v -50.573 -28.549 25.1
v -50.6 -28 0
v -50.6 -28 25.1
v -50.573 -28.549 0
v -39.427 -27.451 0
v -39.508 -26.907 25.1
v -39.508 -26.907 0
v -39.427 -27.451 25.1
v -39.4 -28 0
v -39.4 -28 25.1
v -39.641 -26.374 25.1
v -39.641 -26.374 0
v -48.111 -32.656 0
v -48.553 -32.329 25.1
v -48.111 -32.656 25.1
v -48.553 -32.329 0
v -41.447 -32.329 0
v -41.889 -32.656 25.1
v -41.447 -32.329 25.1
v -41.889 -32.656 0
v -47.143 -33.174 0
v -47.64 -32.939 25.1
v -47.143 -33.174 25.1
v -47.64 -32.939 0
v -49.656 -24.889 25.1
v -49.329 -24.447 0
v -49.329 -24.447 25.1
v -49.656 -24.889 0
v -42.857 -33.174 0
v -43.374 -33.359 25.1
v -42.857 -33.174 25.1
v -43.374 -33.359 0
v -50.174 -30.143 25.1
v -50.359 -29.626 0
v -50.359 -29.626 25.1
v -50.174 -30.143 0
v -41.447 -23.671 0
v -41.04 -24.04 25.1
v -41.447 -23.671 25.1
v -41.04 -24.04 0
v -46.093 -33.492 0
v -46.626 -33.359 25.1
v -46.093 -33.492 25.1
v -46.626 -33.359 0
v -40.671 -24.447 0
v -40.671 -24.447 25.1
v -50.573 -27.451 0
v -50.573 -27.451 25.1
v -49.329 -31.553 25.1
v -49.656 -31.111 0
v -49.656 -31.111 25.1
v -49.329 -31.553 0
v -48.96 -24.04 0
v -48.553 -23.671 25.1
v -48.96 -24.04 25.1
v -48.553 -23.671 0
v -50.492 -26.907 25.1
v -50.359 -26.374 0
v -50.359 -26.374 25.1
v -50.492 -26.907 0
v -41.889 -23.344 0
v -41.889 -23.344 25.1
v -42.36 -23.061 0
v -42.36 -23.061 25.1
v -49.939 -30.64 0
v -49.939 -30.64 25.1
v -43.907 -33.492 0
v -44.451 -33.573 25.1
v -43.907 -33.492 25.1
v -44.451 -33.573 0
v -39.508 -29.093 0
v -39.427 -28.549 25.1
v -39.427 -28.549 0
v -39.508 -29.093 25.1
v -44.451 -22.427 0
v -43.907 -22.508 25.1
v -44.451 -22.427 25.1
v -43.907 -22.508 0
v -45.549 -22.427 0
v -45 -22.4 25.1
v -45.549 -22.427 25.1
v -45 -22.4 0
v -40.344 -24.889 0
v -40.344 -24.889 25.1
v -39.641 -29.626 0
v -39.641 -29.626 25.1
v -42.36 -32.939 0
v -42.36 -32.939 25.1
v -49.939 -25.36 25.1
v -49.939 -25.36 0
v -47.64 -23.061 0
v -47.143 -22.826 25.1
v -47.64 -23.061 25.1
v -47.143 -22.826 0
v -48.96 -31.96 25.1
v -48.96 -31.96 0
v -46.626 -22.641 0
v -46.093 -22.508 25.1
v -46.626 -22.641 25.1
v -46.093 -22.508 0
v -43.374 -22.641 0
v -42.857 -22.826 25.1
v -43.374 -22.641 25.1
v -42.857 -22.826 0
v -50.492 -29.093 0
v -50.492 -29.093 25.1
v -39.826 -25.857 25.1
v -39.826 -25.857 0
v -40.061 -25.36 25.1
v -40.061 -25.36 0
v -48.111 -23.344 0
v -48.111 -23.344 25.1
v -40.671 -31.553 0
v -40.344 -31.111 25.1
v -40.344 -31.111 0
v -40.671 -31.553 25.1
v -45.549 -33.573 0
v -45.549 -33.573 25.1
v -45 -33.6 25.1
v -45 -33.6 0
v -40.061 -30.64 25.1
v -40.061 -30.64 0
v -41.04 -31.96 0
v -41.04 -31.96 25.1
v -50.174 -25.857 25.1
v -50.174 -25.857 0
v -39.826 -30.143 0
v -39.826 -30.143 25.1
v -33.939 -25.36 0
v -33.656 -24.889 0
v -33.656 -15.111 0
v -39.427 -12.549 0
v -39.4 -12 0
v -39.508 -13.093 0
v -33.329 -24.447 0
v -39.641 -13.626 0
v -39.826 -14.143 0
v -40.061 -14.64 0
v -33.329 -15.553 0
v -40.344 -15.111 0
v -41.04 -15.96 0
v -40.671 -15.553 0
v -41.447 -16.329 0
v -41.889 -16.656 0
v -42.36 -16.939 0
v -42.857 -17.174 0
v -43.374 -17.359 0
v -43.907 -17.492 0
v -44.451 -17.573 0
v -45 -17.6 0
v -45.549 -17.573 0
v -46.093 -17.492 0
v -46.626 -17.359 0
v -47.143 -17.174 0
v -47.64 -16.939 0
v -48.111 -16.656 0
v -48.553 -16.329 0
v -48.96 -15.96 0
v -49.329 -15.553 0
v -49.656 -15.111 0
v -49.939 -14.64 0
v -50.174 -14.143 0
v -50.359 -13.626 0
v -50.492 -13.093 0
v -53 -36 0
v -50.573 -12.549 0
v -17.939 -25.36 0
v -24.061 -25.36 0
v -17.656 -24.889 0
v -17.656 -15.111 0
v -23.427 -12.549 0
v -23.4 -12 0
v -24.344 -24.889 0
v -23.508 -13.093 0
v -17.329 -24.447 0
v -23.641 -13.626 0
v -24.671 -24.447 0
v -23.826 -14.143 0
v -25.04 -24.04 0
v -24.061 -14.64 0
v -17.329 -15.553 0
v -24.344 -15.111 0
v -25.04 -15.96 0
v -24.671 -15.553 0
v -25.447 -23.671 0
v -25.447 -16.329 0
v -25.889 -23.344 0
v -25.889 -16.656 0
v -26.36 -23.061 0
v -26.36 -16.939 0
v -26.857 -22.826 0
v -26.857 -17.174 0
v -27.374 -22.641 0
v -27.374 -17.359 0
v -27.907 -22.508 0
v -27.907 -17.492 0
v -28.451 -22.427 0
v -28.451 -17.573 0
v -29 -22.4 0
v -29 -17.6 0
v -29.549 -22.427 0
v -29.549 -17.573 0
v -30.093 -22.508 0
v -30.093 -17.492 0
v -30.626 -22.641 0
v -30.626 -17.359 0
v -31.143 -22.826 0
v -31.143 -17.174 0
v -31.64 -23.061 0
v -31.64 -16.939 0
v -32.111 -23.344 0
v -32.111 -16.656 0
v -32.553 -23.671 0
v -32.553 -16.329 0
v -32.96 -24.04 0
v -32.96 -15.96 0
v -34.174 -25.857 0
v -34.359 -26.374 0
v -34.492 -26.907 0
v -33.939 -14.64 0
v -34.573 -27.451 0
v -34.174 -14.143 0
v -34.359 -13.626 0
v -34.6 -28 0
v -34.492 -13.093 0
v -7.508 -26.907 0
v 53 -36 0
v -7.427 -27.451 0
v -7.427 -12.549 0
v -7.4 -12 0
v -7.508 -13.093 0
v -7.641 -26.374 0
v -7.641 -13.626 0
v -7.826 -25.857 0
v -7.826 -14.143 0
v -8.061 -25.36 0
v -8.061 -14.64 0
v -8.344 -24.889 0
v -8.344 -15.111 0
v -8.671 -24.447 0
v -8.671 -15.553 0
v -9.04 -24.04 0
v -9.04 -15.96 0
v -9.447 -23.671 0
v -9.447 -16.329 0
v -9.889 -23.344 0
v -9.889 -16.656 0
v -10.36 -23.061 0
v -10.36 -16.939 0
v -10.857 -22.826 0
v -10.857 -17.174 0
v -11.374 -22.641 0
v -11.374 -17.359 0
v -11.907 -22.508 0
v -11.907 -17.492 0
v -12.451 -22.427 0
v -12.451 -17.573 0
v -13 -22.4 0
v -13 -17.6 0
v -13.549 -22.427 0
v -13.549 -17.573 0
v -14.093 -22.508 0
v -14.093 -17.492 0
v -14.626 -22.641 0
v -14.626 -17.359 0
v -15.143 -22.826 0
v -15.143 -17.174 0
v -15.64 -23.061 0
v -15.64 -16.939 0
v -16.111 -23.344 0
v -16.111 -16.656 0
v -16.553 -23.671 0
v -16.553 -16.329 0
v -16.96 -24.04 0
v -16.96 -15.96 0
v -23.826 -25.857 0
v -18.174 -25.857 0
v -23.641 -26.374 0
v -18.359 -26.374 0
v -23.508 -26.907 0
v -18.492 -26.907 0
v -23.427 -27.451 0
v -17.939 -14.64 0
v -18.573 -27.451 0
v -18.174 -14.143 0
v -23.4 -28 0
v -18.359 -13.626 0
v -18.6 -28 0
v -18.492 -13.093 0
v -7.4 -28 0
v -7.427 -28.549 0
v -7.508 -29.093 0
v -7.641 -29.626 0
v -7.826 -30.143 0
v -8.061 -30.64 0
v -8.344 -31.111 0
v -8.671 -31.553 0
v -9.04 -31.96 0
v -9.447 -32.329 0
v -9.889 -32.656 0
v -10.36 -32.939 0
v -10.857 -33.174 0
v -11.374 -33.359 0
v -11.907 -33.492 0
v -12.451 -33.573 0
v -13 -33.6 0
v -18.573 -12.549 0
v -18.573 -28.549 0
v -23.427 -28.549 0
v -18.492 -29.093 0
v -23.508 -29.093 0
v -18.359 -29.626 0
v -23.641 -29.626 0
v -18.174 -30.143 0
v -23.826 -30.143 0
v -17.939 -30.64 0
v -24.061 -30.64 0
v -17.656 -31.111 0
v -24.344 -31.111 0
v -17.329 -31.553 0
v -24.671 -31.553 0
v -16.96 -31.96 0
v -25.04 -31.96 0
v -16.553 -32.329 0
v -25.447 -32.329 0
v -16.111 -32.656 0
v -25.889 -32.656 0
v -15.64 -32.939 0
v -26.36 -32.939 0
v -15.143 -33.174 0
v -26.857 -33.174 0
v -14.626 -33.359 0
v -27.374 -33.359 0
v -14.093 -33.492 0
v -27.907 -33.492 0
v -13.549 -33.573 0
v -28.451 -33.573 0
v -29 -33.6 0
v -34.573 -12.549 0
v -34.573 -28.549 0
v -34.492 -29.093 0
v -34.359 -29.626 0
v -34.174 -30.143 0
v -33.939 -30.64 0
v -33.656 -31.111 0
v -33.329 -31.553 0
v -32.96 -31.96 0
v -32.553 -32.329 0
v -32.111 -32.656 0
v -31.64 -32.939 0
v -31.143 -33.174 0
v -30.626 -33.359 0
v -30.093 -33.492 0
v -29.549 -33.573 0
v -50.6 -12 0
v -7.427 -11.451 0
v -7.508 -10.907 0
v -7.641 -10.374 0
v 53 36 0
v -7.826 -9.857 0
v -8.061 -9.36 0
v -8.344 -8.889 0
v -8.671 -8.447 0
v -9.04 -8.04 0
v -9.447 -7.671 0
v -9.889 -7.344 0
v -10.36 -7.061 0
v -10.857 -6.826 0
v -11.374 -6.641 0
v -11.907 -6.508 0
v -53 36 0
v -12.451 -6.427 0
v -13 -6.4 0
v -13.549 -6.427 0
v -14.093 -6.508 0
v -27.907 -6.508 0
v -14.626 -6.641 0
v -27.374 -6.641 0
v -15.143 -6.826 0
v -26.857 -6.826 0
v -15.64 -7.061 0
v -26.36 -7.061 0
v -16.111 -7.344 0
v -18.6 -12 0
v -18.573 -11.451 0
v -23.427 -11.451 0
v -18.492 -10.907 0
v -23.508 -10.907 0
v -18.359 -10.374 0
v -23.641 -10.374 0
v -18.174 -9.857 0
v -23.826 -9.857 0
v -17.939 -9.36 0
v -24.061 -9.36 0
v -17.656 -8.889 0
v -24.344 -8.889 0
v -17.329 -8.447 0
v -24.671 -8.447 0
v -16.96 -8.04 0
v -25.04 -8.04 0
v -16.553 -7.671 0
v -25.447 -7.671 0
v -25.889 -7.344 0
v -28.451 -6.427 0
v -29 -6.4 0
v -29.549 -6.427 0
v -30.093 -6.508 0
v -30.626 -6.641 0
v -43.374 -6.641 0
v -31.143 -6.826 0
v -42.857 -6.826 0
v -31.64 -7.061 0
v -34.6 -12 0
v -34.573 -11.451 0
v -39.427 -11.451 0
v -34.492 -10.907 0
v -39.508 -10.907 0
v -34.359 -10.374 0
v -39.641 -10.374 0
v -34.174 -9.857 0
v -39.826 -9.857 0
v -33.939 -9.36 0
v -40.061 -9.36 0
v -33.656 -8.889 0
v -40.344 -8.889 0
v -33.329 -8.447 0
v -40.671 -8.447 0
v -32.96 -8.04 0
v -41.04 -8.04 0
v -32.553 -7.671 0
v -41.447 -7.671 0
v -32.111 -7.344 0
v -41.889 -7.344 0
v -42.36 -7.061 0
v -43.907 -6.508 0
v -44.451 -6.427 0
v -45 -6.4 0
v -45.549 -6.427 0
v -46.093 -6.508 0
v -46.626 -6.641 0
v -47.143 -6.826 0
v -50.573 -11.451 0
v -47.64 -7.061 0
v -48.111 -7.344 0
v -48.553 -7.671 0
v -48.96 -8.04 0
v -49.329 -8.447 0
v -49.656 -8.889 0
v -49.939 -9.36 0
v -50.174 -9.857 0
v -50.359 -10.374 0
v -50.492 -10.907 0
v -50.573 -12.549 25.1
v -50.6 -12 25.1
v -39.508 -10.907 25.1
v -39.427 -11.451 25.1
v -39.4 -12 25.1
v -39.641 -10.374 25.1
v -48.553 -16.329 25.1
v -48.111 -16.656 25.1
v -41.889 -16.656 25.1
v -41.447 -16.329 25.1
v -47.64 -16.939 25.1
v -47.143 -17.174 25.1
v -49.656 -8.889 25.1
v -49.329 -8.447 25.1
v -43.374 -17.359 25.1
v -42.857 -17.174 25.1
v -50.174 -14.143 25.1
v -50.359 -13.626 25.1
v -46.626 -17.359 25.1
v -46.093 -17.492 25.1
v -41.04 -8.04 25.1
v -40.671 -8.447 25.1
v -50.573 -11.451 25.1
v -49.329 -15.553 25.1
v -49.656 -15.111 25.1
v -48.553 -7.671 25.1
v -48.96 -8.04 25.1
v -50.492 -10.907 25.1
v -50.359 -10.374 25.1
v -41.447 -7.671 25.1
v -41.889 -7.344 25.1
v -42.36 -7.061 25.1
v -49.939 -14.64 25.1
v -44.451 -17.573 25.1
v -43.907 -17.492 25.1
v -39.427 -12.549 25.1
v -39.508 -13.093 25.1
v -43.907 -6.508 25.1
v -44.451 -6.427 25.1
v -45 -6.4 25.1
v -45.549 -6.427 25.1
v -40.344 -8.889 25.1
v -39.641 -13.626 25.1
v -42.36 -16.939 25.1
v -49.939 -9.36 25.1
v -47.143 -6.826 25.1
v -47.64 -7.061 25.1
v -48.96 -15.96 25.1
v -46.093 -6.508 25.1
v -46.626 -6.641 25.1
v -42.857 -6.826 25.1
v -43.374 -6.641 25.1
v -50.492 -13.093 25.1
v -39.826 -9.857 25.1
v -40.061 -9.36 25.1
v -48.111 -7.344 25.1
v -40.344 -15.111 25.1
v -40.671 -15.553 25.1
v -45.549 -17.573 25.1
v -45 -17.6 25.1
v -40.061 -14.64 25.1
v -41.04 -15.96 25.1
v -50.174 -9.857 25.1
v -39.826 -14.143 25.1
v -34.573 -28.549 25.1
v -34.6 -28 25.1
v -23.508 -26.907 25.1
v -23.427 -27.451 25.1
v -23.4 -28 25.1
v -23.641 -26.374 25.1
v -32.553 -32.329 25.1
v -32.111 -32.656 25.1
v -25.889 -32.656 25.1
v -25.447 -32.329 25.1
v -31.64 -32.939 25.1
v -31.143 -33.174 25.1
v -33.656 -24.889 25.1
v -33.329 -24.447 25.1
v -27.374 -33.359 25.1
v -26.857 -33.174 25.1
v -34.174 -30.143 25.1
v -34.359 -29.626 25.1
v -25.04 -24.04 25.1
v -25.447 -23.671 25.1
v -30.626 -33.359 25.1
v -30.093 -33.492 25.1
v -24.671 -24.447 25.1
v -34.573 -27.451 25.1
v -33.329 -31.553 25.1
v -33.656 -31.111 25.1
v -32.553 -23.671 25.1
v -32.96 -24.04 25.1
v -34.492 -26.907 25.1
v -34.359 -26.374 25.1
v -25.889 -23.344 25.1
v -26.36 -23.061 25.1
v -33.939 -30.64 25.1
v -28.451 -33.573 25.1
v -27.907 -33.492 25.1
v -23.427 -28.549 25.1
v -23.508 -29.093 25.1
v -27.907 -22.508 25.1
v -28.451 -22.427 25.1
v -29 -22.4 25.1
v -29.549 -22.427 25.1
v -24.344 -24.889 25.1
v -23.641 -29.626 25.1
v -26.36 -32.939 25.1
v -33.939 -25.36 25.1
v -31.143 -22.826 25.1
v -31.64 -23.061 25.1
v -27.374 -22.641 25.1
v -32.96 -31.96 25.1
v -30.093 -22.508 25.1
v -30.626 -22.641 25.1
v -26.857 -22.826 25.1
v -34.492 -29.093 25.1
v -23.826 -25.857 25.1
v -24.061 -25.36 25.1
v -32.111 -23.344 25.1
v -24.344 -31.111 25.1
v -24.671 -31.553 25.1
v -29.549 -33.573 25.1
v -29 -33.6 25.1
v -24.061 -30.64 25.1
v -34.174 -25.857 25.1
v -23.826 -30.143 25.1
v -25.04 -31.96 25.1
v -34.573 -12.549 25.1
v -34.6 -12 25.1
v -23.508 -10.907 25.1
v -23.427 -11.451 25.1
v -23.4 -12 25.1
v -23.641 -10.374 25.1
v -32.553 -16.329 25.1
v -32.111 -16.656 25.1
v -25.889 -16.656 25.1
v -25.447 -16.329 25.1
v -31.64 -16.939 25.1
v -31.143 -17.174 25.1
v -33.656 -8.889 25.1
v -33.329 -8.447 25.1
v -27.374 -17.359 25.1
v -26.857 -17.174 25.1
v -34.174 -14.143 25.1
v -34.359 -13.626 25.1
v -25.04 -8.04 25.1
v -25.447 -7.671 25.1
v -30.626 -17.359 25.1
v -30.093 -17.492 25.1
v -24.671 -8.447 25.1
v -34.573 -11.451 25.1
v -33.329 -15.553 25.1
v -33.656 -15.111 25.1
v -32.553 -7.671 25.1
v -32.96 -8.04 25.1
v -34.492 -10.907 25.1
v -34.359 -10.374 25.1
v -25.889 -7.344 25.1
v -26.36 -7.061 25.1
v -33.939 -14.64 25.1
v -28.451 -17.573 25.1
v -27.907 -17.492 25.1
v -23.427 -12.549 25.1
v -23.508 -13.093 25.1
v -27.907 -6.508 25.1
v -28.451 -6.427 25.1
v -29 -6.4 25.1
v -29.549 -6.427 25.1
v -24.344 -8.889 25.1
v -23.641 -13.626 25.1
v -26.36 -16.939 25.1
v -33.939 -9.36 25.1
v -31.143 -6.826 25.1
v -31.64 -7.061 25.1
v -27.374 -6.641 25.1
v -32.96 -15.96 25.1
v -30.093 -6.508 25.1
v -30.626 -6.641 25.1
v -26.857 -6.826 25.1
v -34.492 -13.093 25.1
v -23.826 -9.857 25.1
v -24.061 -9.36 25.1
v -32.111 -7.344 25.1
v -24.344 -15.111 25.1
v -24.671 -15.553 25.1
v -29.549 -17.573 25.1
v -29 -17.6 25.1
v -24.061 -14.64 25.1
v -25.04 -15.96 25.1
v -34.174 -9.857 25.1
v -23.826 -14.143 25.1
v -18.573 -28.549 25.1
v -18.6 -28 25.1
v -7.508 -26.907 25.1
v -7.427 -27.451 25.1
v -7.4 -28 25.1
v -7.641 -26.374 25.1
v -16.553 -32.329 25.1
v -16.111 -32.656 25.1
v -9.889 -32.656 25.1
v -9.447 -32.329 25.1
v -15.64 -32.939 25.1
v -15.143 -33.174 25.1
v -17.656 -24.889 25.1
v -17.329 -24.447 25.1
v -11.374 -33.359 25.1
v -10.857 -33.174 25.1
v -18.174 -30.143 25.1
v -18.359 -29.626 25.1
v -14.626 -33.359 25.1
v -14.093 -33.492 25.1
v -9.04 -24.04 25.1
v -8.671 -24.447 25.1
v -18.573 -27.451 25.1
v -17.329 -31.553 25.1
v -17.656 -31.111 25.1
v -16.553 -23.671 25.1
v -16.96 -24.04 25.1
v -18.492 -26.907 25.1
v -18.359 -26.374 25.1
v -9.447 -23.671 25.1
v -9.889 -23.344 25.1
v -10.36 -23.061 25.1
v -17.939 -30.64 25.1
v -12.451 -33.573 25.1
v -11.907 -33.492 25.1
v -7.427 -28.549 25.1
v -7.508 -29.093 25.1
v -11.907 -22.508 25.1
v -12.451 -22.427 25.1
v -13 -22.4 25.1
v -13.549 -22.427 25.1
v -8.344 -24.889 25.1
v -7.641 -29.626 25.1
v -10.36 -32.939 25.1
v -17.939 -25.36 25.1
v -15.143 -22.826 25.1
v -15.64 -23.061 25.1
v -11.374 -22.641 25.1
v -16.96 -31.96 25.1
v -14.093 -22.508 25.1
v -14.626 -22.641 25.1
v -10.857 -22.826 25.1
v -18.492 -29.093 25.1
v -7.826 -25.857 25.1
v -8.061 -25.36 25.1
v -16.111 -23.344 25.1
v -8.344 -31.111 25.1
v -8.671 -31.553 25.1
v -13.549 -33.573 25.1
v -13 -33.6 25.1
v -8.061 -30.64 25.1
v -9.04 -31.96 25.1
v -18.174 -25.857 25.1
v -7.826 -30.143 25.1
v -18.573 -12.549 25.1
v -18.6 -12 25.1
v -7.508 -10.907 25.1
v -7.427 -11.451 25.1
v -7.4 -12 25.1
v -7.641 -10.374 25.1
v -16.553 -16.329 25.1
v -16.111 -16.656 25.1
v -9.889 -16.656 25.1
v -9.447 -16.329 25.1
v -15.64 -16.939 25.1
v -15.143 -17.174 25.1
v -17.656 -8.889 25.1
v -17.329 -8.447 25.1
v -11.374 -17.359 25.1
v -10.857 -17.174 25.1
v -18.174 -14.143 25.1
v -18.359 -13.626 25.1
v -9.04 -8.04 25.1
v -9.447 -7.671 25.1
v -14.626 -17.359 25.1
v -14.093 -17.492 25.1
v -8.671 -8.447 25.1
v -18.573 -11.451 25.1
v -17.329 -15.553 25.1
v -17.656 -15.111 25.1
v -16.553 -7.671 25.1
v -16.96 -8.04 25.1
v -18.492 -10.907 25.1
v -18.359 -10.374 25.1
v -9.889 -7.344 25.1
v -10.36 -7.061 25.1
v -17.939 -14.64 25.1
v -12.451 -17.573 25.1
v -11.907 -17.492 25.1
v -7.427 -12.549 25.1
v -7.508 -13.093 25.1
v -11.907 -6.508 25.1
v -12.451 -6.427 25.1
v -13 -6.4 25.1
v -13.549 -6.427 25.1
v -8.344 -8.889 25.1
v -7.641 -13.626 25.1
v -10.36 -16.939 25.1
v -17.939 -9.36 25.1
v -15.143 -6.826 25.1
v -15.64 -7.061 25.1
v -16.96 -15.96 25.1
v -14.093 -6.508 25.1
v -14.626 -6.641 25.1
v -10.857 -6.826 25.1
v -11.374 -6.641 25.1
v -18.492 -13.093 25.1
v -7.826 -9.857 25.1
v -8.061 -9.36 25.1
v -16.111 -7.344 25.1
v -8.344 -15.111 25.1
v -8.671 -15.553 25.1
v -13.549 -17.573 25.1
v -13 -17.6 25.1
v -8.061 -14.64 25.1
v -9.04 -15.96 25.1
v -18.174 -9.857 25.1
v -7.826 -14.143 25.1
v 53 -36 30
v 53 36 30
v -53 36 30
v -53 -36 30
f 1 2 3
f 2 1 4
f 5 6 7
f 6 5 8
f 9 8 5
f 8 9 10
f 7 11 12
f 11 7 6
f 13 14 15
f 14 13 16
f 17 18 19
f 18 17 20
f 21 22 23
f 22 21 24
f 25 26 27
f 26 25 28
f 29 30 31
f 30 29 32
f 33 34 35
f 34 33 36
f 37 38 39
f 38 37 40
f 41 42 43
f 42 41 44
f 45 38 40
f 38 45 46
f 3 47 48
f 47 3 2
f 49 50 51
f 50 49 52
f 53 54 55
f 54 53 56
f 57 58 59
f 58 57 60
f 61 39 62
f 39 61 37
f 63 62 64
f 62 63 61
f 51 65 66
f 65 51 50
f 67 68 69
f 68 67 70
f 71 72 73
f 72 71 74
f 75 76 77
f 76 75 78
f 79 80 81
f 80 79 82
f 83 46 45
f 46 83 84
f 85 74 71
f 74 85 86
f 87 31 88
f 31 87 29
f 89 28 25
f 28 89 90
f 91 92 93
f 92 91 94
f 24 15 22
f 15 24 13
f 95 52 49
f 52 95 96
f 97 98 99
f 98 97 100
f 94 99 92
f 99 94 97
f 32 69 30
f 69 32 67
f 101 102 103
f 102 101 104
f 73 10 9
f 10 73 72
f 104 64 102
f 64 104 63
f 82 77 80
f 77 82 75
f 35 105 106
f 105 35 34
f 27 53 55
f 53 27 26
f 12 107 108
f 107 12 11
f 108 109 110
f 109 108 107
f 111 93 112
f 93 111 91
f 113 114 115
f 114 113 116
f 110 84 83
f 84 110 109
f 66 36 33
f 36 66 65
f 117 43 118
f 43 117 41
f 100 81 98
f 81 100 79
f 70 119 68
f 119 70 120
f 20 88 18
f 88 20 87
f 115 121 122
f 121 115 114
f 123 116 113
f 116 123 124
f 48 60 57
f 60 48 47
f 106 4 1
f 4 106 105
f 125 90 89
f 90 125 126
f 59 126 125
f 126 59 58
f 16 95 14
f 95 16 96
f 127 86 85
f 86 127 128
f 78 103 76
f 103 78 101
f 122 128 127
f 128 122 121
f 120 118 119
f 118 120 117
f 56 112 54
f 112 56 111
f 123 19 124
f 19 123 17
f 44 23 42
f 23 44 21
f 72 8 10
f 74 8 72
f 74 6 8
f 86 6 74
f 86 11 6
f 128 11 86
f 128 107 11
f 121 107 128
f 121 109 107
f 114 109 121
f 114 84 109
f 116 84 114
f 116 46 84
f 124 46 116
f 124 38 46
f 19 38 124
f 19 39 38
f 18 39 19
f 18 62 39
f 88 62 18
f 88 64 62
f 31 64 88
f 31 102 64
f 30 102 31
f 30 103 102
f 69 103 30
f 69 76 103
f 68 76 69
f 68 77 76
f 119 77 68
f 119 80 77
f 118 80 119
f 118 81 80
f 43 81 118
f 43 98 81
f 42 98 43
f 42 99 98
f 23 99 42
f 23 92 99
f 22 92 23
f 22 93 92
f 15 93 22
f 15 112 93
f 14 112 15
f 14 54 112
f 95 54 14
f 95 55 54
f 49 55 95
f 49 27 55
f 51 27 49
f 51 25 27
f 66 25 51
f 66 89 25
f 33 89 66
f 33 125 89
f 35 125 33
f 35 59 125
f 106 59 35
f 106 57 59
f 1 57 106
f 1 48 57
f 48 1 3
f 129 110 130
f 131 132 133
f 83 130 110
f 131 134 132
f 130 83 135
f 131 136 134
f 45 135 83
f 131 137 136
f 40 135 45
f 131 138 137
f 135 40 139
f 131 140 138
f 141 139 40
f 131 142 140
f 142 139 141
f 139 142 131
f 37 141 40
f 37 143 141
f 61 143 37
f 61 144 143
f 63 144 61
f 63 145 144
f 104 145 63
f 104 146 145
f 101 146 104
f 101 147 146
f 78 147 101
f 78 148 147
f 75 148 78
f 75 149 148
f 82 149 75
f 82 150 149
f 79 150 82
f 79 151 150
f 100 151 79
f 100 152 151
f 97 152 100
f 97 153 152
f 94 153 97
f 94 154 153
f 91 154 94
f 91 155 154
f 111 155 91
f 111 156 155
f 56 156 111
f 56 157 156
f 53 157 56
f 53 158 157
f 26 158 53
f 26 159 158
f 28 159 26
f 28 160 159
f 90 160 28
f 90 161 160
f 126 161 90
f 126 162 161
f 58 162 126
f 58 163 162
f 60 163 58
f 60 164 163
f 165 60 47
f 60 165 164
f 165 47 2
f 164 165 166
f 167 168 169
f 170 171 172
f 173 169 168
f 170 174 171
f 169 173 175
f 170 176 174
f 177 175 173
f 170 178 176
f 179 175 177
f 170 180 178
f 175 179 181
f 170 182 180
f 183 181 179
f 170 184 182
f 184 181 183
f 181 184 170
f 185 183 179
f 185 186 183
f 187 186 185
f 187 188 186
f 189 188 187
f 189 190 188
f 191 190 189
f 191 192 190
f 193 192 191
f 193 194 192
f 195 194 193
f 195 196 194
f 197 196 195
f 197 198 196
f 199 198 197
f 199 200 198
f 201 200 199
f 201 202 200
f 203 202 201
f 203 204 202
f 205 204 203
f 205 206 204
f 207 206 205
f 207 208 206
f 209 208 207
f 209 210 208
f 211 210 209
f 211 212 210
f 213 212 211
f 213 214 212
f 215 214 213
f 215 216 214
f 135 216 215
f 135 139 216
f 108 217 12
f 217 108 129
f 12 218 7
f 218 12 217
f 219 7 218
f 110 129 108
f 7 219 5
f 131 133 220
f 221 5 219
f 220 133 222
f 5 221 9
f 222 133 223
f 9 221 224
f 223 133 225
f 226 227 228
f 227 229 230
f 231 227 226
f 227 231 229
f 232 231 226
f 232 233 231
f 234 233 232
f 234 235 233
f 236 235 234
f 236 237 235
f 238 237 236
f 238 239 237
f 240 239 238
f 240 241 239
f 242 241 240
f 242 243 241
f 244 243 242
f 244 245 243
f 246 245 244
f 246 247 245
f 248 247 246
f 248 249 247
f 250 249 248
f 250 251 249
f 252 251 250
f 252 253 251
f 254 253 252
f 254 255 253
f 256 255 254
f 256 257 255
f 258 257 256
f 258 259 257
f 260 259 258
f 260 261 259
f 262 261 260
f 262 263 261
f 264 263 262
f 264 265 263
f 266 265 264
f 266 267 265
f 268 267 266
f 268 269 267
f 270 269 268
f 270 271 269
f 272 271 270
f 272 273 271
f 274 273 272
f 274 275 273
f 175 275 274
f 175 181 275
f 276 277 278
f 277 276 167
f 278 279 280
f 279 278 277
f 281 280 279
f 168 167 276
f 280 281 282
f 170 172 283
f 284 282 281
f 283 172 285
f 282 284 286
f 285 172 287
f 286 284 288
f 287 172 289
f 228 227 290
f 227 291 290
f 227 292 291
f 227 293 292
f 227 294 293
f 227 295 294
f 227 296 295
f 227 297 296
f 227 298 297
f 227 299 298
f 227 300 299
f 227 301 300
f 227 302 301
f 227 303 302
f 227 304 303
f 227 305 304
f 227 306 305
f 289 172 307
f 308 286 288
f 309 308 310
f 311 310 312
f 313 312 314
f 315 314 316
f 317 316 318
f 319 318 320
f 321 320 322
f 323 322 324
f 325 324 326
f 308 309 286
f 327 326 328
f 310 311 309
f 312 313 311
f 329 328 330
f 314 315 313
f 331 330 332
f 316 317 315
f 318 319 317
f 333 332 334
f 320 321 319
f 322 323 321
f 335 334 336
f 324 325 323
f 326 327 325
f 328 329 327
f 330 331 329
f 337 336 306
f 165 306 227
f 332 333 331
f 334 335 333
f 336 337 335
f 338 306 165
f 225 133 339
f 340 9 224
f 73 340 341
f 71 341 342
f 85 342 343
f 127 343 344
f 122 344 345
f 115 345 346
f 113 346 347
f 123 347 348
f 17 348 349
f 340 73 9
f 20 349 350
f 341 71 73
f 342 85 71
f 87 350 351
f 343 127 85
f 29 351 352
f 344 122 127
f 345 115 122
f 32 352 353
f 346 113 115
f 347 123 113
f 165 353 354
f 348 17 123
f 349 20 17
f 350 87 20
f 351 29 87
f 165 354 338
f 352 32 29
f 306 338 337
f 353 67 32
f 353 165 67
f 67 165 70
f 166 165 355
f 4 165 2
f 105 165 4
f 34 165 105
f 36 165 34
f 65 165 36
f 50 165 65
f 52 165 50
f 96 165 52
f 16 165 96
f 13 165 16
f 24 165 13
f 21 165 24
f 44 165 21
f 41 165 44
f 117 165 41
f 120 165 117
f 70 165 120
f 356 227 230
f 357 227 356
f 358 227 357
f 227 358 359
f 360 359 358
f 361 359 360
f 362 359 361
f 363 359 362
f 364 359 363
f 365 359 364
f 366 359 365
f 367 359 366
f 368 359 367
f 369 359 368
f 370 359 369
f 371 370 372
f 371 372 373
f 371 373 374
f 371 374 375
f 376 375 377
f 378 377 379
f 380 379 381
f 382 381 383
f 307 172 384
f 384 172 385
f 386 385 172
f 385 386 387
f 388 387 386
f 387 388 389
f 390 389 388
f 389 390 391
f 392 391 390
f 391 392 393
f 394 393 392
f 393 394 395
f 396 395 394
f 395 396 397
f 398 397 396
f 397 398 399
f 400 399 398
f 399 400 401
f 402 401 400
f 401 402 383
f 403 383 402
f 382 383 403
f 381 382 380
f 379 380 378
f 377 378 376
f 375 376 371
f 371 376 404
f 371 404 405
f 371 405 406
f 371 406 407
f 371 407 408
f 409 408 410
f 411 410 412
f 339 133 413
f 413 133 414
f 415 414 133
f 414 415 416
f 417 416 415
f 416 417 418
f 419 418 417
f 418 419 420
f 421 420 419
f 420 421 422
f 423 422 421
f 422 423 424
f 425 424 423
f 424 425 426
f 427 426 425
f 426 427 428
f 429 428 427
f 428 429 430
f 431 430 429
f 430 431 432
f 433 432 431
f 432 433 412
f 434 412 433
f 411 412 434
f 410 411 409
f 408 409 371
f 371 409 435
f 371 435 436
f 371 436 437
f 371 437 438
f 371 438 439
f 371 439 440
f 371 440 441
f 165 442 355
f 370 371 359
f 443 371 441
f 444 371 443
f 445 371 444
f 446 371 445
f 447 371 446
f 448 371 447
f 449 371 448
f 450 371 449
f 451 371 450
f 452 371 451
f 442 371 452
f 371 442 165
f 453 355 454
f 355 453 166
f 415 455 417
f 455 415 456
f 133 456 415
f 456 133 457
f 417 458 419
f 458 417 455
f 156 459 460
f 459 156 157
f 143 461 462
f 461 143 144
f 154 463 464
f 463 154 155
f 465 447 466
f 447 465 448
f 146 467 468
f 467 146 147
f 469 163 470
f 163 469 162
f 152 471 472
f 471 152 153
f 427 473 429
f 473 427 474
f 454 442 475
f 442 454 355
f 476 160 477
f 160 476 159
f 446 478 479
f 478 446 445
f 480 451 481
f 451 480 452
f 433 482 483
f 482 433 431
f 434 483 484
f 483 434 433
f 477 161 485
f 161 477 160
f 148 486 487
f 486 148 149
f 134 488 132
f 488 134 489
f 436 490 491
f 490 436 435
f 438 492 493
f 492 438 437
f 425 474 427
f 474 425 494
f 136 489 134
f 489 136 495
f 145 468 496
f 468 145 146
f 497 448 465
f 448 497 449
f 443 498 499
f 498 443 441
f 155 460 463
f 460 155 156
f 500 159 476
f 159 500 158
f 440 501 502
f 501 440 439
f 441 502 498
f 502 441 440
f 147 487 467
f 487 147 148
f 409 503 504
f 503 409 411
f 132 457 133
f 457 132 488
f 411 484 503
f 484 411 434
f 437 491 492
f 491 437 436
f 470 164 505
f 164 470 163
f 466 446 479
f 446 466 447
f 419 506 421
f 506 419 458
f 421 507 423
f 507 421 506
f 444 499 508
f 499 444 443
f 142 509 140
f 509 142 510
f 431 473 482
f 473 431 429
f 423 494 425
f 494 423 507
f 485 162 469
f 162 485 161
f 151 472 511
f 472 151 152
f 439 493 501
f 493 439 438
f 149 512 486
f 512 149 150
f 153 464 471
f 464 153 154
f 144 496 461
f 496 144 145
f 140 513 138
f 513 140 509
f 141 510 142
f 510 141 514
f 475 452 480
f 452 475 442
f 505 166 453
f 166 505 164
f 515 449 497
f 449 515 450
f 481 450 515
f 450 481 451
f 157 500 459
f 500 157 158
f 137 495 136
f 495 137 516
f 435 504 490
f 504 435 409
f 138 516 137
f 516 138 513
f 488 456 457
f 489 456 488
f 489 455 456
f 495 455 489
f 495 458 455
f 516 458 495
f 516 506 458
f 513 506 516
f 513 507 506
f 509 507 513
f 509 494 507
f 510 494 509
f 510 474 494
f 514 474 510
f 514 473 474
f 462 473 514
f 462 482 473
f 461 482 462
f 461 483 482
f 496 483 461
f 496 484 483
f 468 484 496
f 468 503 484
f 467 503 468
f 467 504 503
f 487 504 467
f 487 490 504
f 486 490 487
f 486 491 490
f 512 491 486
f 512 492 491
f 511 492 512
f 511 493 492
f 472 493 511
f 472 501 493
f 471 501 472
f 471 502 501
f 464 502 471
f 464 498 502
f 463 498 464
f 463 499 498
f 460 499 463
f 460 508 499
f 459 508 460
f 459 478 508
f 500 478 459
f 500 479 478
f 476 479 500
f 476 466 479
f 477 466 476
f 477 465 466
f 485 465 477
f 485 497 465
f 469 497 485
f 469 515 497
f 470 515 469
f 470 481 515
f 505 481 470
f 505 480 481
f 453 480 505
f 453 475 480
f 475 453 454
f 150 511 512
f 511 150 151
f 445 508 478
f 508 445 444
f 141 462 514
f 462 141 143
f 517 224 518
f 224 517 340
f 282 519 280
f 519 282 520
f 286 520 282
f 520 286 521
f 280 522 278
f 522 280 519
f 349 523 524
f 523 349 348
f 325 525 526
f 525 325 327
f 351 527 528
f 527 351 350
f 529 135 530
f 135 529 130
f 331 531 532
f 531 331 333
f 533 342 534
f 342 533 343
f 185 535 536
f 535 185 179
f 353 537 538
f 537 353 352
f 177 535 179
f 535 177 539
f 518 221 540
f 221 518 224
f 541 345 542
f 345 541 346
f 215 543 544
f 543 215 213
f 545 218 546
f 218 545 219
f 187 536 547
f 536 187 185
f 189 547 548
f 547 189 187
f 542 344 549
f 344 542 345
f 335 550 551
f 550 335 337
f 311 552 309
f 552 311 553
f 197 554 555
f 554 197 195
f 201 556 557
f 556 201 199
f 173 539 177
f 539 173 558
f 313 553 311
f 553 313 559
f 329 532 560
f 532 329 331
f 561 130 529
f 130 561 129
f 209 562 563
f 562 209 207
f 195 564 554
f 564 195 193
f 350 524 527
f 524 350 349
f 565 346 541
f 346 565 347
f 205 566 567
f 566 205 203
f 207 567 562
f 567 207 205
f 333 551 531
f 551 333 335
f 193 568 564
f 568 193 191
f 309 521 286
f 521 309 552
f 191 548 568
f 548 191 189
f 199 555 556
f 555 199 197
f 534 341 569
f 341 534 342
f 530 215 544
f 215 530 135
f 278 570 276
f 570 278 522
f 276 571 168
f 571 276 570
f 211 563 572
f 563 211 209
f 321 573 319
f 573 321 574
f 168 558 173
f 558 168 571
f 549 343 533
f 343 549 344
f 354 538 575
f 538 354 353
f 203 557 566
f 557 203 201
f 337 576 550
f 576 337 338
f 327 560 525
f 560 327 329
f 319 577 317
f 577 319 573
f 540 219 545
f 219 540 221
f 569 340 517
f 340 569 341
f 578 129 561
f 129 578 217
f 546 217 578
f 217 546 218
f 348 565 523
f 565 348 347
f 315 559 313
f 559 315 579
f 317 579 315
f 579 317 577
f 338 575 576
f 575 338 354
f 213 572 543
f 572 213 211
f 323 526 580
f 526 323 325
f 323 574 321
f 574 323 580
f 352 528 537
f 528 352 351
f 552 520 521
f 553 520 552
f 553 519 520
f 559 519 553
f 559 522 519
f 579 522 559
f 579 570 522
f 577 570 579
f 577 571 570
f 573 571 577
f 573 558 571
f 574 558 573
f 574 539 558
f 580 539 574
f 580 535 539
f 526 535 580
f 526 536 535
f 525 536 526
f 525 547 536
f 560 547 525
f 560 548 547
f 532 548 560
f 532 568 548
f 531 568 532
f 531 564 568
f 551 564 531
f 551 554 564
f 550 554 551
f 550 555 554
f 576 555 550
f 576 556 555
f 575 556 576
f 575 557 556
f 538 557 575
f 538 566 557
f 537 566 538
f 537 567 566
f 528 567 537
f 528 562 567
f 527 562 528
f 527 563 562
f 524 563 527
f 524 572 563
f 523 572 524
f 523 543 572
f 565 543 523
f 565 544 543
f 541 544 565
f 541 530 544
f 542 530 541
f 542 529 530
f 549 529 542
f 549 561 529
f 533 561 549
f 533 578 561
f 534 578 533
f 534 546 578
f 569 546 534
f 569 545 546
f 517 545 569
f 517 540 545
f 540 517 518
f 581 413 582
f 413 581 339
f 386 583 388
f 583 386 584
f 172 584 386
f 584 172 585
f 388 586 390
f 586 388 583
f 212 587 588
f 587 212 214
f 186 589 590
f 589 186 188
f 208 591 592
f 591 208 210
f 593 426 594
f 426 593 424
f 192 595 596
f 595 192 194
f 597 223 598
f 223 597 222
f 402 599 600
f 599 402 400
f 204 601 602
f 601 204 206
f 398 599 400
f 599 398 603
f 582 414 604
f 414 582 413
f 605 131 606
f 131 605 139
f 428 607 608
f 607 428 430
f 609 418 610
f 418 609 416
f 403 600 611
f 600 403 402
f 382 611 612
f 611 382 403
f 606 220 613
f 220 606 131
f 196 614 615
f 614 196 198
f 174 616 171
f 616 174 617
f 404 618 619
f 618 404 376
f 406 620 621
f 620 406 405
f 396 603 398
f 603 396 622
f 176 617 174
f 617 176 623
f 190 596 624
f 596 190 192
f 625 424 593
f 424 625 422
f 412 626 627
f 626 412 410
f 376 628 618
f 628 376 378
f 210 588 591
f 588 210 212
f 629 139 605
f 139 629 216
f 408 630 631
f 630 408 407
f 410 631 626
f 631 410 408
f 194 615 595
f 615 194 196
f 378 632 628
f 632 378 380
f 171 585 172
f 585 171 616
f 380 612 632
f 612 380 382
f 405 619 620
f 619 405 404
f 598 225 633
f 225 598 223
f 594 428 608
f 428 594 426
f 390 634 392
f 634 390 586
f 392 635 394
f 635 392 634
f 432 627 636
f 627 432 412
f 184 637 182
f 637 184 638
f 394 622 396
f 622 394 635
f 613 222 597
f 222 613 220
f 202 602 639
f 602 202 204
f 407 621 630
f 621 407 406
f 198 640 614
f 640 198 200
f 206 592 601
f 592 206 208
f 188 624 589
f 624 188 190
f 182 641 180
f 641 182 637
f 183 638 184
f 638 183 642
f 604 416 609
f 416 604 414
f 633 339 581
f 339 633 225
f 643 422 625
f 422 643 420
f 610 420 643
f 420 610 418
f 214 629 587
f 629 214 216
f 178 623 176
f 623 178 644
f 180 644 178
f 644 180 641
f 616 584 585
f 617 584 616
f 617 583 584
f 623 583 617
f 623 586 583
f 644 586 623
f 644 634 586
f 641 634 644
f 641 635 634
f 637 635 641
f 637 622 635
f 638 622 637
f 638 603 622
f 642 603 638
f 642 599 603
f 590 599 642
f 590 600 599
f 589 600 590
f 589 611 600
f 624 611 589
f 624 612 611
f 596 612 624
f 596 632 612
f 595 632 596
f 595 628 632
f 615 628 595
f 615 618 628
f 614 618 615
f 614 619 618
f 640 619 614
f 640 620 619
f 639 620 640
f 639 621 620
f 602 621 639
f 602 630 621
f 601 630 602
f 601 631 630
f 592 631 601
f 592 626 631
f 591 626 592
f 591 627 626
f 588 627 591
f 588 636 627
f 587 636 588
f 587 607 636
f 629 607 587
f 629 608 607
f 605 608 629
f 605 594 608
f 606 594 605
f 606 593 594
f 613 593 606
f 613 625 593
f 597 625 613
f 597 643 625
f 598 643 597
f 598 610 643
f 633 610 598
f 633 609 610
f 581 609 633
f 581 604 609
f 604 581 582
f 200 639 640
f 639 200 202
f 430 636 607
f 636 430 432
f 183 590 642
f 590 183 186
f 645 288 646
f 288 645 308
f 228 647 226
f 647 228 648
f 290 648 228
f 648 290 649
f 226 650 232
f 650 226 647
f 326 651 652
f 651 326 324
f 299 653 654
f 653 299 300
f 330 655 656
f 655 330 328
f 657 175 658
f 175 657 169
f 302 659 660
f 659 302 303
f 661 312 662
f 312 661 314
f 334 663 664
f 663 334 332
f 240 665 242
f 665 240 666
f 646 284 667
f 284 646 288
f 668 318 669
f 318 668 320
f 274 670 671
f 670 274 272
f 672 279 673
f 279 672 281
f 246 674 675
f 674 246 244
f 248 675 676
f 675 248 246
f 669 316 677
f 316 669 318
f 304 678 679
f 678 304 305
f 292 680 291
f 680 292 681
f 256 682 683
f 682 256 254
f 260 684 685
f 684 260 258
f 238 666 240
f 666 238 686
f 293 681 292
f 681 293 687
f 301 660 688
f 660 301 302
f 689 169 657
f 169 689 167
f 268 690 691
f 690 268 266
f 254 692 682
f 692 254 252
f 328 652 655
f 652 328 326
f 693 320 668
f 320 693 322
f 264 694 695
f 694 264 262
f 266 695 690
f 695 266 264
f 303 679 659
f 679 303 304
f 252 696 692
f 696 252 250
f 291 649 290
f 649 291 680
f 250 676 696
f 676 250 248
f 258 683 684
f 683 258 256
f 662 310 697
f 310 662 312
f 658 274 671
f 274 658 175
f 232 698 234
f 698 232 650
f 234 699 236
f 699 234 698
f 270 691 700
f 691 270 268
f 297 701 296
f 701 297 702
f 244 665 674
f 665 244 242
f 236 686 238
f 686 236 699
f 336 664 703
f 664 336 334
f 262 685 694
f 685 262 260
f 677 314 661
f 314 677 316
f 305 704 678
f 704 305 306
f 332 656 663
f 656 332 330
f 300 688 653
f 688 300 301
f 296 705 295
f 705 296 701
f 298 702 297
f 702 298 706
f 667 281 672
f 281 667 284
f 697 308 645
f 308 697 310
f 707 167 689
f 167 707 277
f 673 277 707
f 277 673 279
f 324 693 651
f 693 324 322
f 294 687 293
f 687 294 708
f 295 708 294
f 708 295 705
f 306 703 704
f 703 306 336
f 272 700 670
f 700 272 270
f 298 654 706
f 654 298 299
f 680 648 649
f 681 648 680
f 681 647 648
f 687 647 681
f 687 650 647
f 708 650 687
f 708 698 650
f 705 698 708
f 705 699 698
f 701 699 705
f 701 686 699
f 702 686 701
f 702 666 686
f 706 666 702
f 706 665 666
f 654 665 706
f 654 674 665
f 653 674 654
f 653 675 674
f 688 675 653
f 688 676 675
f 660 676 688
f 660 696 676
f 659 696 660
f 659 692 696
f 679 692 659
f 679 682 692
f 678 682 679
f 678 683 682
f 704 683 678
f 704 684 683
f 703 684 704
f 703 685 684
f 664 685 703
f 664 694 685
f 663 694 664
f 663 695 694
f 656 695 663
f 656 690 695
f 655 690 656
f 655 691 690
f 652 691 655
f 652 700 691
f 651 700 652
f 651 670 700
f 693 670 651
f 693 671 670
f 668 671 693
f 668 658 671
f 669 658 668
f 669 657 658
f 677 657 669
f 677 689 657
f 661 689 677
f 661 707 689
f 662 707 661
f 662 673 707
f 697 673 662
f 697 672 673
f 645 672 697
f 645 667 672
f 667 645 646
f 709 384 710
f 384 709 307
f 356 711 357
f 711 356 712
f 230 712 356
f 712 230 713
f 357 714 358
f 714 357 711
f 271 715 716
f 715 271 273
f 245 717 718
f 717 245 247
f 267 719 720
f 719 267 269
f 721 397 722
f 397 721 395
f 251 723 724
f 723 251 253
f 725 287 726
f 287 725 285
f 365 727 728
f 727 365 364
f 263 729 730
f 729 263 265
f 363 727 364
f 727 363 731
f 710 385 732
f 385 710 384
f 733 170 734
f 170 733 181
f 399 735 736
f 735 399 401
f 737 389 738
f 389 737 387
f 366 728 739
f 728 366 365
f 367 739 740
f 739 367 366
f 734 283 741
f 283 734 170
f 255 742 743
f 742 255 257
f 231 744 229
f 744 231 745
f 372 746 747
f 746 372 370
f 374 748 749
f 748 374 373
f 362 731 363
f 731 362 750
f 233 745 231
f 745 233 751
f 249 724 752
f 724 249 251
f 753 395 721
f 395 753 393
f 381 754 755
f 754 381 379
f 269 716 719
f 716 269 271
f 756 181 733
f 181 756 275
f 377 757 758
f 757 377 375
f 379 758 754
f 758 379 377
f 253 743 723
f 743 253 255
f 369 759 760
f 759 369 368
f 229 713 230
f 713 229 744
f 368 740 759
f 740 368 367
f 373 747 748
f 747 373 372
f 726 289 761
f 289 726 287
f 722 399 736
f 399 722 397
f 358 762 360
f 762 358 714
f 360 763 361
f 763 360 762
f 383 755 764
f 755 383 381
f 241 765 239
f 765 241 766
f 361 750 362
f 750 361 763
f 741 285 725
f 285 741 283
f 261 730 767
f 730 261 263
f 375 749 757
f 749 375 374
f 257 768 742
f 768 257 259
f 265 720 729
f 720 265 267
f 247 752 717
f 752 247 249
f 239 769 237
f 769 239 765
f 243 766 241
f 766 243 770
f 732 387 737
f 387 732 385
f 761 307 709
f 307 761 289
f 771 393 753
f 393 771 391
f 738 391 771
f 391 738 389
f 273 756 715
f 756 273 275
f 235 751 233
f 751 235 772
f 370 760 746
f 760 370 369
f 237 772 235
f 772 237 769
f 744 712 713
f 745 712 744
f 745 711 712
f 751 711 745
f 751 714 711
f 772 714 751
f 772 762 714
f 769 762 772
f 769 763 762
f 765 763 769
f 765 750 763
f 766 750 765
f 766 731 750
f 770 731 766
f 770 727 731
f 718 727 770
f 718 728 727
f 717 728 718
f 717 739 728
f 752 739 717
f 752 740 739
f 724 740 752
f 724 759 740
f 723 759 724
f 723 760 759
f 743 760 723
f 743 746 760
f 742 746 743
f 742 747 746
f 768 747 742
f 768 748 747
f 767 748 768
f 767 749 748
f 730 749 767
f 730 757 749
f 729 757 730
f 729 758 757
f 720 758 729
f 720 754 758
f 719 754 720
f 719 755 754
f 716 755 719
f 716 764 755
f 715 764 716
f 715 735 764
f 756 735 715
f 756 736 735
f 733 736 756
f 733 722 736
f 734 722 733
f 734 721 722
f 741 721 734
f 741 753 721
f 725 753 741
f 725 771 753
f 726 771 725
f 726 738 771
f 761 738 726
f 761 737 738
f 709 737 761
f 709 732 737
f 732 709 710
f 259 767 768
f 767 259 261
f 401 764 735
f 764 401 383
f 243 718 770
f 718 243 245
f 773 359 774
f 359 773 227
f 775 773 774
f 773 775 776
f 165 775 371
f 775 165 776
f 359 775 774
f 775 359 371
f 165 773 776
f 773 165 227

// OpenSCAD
// Bench rack for 1.5 mL microcentrifuge tubes.
// Solid block 106x72x30 mm with 24 vertical holes (4 rows x 6 columns).
// Holes are 11.2 mm diameter, 25 mm deep, centred on the block.

L     = 106;   // Length (X)
W     = 72;    // Width (Y)
H     = 30;    // Height (Z)
n_x   = 6;     // Number of holes along X
n_y   = 4;     // Number of holes along Y
p_x   = 16;    // Pitch along X
p_y   = 16;    // Pitch along Y
d_h   = 11.2;  // Hole diameter
d_h_d = 25;    // Hole depth

$fn = 64;

difference() {
    // Main block
    translate([-L / 2, -W / 2, 0]) cube([L, W, H]);

    // Holes
    for (i = [0 : n_x - 1]) {
        for (j = [0 : n_y - 1]) {
            // Calculate position for this hole relative to the block centre
            // i goes 0..5, j goes 0..3
            // We want the grid to be centred, so we offset by half the total span
            pos_x = -L / 2 + (i - (n_x - 1) / 2) * p_x;
            pos_y = -W / 2 + (j - (n_y - 1) / 2) * p_y;
            
            // Hole cylinder: 11.2mm diameter, 25mm deep
            // Extend slightly past the bottom face to ensure clean cut
            translate([pos_x, pos_y, 0]) 
                cylinder(h = d_h_d + 0.1, d = d_h);
        }
    }
}
